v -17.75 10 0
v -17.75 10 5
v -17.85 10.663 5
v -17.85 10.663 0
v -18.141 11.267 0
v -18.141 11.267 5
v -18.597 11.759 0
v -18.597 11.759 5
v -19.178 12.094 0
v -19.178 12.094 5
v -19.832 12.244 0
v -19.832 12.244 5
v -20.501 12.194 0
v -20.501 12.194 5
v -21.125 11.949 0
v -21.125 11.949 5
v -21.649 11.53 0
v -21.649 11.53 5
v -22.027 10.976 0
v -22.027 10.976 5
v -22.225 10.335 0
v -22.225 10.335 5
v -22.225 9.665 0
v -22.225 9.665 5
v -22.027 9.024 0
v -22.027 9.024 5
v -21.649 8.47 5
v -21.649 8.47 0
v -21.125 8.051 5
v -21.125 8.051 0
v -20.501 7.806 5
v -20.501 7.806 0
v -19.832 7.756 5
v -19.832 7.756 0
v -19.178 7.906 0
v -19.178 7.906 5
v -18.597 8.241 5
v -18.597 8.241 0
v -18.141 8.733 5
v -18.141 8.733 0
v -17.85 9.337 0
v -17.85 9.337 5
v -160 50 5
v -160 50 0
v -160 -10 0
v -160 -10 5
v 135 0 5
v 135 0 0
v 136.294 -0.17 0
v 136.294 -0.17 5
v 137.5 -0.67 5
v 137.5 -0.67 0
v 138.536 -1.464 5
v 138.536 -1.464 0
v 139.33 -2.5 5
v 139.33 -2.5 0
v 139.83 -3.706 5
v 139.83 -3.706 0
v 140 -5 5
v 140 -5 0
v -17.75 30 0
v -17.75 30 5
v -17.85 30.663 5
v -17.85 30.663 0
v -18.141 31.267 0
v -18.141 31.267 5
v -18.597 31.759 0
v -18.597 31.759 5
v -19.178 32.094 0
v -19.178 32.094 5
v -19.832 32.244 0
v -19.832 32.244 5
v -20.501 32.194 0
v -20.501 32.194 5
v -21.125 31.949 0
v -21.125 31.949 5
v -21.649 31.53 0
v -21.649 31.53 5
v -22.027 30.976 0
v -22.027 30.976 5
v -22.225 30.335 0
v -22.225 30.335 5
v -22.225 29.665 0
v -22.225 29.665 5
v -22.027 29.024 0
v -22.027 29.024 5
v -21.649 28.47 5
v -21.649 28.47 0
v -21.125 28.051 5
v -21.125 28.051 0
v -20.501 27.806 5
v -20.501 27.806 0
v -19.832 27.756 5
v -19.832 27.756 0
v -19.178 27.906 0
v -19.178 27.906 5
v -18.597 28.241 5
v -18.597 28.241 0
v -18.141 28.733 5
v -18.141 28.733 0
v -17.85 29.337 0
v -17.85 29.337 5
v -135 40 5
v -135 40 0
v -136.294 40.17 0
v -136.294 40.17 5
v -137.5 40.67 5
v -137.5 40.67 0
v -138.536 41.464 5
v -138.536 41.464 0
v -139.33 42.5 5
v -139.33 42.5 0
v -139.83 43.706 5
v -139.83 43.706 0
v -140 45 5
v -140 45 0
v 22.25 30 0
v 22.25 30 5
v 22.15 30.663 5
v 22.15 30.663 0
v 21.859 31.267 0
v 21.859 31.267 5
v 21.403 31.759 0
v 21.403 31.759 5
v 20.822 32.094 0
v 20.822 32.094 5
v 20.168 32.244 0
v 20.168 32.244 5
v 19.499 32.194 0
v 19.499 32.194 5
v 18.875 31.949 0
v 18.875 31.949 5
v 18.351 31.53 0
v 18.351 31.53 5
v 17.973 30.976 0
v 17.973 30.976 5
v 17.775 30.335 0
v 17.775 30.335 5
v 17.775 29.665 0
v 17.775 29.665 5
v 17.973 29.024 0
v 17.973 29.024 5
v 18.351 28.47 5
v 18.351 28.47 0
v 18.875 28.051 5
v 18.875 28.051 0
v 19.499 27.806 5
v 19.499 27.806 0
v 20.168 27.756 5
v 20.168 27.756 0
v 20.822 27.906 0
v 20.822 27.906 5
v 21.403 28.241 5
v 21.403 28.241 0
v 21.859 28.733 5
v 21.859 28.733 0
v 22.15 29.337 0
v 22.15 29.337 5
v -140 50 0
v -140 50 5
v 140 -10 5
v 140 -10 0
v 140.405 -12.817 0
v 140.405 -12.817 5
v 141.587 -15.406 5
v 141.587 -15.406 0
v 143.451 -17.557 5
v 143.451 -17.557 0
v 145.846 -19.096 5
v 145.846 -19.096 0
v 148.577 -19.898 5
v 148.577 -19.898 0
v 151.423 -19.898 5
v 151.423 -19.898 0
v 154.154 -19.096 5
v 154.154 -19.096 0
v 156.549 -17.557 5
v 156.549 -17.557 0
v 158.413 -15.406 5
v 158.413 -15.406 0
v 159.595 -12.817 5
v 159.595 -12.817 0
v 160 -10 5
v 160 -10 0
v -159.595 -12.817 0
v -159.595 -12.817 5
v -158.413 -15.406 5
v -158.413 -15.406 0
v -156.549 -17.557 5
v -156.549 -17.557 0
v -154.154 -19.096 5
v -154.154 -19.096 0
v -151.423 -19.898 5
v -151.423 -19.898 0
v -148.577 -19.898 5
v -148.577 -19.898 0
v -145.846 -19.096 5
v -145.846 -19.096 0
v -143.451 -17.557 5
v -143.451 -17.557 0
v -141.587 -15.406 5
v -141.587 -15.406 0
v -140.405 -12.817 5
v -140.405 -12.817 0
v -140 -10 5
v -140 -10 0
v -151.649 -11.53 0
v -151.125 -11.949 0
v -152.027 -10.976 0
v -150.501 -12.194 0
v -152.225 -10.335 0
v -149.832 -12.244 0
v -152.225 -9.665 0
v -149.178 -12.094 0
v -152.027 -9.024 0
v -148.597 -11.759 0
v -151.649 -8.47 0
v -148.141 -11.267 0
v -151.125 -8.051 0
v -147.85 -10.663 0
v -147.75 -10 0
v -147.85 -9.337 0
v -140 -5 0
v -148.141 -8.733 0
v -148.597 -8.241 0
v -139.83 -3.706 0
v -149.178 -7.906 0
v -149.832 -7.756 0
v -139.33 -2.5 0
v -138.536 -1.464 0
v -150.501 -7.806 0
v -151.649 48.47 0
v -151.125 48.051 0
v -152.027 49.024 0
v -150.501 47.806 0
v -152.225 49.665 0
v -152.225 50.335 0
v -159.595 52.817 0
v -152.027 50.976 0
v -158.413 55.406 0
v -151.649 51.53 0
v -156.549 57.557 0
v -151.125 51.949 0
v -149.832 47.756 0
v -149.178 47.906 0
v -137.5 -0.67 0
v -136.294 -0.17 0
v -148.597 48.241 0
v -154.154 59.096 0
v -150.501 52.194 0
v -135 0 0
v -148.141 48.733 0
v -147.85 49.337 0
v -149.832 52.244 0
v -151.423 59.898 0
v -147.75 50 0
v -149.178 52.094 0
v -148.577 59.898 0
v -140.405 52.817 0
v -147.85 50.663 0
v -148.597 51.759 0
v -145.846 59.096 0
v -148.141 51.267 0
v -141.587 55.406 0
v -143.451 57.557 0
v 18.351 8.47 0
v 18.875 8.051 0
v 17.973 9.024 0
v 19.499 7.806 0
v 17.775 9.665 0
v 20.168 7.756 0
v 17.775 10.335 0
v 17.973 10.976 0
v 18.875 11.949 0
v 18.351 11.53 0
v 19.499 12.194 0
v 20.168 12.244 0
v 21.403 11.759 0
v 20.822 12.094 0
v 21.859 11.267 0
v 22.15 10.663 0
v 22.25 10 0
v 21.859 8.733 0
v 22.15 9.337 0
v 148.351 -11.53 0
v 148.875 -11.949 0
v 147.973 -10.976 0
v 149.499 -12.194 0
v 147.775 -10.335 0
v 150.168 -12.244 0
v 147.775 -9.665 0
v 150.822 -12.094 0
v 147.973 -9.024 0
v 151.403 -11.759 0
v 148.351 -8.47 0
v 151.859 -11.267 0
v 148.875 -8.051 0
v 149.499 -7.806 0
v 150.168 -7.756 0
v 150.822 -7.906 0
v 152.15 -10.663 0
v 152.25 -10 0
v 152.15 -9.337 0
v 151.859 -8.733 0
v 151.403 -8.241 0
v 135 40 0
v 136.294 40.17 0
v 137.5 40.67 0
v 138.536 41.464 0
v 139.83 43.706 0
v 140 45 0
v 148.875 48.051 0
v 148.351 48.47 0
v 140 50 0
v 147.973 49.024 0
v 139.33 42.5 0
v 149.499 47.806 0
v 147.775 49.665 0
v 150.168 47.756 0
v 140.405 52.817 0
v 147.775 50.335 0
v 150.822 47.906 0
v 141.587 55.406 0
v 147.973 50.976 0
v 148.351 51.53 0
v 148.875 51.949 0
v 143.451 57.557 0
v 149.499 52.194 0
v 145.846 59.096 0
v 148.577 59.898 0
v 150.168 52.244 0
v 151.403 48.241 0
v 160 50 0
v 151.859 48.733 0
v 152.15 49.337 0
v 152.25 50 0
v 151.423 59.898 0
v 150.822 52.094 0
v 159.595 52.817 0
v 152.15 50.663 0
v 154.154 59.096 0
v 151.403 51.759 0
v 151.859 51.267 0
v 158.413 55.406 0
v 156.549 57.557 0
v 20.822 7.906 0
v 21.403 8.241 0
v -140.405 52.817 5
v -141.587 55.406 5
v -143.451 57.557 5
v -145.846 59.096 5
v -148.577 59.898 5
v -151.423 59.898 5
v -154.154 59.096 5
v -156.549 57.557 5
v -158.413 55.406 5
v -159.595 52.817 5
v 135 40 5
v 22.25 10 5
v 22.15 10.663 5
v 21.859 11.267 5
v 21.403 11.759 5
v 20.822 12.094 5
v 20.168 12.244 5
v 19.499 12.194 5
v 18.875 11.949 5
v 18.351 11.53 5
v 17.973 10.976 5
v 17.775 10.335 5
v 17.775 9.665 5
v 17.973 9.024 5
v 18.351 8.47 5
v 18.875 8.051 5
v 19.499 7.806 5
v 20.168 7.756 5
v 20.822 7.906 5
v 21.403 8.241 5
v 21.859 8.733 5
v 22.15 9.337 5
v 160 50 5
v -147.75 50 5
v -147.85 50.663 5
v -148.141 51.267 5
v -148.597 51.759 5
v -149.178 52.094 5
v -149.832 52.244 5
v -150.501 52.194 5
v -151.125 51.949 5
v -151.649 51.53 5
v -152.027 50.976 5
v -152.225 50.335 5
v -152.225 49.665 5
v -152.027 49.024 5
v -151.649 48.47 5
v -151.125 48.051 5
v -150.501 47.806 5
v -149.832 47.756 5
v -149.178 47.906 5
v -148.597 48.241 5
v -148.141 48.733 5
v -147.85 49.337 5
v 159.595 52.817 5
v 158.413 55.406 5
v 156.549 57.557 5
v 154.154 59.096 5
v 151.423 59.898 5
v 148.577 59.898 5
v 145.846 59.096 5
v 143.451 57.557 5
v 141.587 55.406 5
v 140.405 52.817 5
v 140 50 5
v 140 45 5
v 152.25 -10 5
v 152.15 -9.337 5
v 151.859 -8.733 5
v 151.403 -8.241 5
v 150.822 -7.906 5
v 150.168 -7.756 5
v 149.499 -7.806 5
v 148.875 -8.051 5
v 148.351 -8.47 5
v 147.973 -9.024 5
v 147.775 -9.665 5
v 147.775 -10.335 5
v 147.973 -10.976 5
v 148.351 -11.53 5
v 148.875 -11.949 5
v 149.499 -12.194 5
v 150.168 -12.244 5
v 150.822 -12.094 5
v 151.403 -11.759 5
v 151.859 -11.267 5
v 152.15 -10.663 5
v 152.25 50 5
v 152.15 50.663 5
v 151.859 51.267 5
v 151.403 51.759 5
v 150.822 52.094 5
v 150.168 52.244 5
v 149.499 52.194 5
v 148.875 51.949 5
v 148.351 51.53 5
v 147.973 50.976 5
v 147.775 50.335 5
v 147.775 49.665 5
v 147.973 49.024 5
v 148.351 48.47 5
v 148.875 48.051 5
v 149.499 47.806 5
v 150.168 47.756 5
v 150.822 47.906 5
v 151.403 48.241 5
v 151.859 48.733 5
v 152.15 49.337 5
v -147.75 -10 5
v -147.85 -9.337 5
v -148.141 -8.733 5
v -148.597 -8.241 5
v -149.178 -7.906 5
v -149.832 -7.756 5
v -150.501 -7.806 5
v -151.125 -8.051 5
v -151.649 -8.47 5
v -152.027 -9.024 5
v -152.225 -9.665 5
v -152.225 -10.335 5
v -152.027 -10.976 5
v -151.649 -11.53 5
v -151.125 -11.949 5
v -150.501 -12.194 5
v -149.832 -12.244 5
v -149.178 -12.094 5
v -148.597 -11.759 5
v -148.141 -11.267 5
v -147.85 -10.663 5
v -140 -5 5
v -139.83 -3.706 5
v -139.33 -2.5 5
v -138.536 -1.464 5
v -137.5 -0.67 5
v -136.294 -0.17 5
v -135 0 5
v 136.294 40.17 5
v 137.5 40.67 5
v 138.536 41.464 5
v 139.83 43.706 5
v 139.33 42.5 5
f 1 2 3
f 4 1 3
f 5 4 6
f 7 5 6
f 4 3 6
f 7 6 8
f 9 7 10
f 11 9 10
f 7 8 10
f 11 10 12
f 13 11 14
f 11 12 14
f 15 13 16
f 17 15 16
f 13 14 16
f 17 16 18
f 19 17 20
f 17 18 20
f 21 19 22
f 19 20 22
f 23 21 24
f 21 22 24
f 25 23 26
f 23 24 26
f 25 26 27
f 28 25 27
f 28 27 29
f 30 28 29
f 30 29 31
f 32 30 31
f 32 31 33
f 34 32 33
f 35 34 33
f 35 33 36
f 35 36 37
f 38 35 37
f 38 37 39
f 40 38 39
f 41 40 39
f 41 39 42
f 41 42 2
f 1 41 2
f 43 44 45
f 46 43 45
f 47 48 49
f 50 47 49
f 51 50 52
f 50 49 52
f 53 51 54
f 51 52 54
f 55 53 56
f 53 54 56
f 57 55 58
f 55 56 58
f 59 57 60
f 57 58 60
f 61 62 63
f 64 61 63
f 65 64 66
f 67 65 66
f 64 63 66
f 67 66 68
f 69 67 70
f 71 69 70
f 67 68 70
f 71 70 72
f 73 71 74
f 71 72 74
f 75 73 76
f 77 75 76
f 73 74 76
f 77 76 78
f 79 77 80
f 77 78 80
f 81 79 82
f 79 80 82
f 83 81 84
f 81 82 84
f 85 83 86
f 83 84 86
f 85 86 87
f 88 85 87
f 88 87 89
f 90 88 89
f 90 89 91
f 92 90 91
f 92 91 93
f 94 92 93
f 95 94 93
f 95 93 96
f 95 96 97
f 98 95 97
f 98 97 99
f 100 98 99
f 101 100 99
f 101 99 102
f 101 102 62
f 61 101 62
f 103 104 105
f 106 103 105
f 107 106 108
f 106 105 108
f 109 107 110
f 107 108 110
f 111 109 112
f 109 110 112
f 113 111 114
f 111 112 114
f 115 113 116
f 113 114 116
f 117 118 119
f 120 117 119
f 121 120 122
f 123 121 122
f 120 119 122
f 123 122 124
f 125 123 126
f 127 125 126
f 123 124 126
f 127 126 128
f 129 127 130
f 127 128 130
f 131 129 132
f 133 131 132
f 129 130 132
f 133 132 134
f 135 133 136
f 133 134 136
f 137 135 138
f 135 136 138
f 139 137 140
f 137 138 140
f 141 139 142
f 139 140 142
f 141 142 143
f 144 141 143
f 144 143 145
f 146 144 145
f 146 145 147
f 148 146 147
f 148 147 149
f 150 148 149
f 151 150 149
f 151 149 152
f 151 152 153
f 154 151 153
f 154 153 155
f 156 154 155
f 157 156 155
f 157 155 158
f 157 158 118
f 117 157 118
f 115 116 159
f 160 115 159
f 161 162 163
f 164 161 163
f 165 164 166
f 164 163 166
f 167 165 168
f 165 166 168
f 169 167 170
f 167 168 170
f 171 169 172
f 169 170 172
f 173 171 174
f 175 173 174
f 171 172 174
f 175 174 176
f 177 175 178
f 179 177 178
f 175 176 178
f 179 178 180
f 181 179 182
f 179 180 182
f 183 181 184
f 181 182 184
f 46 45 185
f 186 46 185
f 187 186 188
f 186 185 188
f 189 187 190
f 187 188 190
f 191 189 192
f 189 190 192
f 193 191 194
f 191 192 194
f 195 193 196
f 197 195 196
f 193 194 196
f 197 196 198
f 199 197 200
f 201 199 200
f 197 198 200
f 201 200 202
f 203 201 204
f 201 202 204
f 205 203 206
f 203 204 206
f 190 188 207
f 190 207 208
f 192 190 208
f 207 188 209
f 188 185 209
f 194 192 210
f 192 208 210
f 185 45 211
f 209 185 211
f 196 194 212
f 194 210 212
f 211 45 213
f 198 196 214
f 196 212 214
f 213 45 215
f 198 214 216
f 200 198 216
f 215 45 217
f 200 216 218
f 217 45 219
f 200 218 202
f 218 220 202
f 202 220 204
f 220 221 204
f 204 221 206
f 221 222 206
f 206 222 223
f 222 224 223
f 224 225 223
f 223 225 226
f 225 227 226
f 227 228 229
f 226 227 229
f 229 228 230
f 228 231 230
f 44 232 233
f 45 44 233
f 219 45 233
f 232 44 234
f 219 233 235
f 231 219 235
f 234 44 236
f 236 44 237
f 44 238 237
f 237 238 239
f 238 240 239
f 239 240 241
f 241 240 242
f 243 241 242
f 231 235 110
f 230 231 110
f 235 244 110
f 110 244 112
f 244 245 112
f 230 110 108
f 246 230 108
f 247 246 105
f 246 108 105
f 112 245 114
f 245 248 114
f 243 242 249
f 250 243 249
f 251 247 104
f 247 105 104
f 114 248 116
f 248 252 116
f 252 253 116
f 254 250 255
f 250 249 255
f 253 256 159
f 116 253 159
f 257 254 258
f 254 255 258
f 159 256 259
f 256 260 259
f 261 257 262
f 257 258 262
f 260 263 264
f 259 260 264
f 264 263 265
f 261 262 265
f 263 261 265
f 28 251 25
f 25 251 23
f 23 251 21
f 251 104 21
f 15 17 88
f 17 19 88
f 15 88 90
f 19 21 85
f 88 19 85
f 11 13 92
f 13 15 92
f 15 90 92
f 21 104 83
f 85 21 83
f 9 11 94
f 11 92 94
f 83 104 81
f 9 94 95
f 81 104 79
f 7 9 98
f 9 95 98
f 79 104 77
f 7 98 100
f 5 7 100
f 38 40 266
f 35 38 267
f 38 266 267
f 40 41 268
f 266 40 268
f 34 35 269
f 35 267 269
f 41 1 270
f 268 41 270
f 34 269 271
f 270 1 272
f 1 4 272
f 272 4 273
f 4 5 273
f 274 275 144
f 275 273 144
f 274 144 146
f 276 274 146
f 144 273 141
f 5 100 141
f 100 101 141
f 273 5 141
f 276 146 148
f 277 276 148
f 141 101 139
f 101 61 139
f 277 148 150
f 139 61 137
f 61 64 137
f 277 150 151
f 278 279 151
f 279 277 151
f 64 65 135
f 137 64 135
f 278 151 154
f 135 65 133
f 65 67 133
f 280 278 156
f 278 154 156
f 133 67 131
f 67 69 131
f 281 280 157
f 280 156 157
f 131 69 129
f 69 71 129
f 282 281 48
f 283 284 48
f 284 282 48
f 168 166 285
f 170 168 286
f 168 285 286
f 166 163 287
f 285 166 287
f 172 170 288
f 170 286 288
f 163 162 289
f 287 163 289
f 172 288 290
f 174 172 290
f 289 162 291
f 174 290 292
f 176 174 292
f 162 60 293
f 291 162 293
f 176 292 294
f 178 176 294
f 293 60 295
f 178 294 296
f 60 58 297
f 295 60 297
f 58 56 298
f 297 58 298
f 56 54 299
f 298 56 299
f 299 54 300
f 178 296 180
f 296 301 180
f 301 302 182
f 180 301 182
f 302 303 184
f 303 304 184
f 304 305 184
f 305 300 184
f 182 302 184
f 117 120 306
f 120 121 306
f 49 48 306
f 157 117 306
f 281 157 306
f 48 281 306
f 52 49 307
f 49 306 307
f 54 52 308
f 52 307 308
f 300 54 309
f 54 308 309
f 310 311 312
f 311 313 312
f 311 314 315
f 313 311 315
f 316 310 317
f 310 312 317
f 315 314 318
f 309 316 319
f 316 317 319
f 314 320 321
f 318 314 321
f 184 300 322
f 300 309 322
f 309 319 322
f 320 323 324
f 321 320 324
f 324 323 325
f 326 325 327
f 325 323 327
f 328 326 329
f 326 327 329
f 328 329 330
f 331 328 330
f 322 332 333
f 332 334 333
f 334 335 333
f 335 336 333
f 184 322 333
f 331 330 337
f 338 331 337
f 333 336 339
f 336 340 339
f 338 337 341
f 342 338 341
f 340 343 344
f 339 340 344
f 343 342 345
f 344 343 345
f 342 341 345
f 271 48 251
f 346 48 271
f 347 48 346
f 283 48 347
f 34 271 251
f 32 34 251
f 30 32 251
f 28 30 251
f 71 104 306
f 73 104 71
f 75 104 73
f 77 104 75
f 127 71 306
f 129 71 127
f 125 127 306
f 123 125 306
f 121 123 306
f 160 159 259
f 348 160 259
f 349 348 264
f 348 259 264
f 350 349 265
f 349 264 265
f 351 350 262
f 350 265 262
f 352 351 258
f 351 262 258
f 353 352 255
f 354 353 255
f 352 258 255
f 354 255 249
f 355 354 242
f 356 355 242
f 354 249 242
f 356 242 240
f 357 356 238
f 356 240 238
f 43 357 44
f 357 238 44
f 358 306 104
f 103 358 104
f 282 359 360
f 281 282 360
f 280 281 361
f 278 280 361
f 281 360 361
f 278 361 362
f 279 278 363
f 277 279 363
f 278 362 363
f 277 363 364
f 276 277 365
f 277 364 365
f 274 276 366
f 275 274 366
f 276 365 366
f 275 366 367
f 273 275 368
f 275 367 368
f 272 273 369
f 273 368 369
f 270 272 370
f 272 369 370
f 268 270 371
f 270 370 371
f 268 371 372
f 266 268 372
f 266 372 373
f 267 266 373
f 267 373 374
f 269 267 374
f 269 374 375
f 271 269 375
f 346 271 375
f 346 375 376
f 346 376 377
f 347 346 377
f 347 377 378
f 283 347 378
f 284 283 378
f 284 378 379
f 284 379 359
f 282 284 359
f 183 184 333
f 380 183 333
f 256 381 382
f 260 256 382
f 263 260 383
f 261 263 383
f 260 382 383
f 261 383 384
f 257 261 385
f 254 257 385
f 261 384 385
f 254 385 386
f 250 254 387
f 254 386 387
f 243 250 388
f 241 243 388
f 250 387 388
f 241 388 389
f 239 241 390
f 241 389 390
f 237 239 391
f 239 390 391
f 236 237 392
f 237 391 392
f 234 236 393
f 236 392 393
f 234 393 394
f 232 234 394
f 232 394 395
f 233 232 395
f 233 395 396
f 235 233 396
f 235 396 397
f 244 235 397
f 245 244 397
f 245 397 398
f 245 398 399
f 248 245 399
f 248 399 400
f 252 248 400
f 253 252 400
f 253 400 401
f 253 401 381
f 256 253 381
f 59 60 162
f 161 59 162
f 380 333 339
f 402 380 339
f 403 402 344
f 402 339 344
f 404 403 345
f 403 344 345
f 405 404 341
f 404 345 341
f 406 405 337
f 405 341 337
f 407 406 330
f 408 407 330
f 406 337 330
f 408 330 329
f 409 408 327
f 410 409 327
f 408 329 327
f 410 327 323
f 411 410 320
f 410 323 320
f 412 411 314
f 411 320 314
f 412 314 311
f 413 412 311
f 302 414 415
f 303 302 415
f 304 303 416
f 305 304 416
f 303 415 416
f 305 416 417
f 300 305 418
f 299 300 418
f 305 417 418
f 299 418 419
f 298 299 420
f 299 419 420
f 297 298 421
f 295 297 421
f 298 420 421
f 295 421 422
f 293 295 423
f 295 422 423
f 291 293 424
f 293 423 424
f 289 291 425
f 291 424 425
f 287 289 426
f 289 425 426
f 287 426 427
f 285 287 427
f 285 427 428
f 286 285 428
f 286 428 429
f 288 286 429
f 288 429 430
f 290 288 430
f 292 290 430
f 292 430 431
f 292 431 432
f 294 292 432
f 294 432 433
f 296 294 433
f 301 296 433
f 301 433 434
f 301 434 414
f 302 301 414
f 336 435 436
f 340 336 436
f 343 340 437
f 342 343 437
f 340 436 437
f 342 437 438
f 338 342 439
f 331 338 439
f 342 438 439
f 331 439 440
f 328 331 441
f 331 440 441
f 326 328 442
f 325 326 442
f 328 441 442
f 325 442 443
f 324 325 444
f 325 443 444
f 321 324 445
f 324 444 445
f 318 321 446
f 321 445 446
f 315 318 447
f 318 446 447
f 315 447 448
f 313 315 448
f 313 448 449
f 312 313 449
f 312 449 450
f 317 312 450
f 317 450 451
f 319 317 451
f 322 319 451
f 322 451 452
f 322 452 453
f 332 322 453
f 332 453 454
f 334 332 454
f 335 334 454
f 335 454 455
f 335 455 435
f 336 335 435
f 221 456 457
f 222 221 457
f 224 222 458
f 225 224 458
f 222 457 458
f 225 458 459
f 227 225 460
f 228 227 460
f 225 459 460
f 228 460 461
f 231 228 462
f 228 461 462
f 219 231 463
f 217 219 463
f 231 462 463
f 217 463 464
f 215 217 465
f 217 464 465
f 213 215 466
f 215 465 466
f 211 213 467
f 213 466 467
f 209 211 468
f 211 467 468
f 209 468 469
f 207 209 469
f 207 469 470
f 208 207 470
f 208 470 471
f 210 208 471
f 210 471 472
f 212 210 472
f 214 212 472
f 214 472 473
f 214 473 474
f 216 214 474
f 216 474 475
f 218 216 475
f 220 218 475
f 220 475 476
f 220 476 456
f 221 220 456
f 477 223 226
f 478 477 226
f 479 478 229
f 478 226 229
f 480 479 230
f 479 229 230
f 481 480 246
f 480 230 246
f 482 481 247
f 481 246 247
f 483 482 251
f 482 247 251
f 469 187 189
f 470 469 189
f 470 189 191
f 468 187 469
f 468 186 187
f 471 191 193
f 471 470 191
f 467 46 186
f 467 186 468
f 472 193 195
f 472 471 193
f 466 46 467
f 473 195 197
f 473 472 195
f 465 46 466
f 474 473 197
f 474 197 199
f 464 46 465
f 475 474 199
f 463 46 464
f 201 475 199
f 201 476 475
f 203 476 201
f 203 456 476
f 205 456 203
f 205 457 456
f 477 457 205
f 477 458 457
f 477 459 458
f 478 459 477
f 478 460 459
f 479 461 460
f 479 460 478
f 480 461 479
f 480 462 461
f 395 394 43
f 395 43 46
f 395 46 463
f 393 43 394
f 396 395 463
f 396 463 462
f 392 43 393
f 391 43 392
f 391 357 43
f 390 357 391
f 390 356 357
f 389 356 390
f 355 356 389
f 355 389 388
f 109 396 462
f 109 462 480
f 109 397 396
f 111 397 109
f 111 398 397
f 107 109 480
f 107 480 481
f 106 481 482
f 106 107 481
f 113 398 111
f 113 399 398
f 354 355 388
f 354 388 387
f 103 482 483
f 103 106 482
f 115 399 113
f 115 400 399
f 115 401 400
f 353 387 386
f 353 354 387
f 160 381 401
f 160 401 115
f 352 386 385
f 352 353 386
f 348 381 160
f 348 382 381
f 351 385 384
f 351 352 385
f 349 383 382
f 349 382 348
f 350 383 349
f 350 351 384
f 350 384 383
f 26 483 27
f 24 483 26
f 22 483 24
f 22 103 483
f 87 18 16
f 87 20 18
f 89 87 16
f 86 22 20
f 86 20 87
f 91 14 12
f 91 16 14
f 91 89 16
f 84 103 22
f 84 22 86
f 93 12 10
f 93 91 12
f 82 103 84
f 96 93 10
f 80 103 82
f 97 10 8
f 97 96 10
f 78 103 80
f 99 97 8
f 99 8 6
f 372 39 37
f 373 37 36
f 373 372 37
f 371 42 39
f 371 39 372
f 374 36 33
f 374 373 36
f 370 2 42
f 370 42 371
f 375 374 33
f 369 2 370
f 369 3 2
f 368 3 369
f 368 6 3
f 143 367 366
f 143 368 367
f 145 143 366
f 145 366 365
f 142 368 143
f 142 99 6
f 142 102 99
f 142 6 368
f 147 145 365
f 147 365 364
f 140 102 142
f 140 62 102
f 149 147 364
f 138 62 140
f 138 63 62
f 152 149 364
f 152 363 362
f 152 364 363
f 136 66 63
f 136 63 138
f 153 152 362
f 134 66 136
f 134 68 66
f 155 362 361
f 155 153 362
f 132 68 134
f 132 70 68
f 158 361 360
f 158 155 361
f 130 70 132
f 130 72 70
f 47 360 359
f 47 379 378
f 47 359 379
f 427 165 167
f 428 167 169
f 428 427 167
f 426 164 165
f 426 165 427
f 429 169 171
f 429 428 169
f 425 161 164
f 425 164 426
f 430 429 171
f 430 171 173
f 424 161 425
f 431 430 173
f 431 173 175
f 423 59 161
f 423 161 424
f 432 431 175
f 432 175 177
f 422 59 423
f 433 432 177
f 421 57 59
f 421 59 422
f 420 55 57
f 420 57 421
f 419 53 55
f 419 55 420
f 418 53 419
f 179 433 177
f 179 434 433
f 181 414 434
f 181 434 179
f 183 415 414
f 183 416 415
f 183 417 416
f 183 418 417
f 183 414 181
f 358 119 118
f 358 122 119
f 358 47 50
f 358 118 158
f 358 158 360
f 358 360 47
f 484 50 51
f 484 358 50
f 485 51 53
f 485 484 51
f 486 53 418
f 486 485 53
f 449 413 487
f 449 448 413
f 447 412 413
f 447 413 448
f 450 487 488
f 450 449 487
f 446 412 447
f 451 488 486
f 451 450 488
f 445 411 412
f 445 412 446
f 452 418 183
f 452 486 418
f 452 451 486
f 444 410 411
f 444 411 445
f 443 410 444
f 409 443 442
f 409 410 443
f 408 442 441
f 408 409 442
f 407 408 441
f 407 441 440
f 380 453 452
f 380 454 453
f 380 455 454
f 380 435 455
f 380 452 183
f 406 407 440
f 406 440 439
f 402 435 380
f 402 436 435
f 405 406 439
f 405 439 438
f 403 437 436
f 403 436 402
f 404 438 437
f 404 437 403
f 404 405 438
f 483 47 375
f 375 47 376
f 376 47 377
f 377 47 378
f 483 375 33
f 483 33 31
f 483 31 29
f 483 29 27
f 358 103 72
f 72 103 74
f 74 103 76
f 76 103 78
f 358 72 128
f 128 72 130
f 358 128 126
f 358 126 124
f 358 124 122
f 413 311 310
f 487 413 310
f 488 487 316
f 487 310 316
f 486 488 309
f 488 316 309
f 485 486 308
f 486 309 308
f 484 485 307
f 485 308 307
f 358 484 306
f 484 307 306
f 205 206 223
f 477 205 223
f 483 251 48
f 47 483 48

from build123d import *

# Parameters (mm, degrees)
BOSS_EXTRU_1_DEPTH = 5
D_GAGEMENT_M41_D   = 4.5
D_GAGEMENT_M42_D   = 4.5


with BuildPart() as part:
    # Esquisse1 → Boss.-Extru.1 (new body)
    with BuildSketch(Plane.XY):
        with BuildLine():
            Line((-135, 0), (135, 0))
            ThreePointArc((135, 0), (138.535533906, -1.464466094), (140, -5))
            Line((140, -5), (140, -10))
            ThreePointArc((140, -10), (150, -20), (160, -10))
            Line((160, -10), (160, 50))
            ThreePointArc((160, 50), (150, 60), (140, 50))
            Line((140, 50), (140, 45))
            ThreePointArc((140, 45), (138.535533906, 41.464466094), (135, 40))
            Line((135, 40), (-135, 40))
            ThreePointArc((-135, 40), (-138.535533906, 41.464466094), (-140, 45))
            Line((-140, 45), (-140, 50))
            ThreePointArc((-140, 50), (-150, 60), (-160, 50))
            Line((-160, 50), (-160, -10))
            ThreePointArc((-160, -10), (-150, -20), (-140, -10))
            Line((-140, -10), (-140, -5))
            ThreePointArc((-140, -5), (-138.535533906, -1.464466094), (-135, 0))
        make_face()
    extrude(amount=BOSS_EXTRU_1_DEPTH)

    # Dégagement M41 (through all)
    with Locations(Plane(origin=(0, 0, 0), x_dir=(-1, 0, 0), z_dir=(0, 0, -1))):
        with Locations((-150, -10), (150, 50), (150, -10), (-150, 50)):
            Hole(D_GAGEMENT_M41_D / 2)

    # Dégagement M42 (through all)
    with Locations(Plane(origin=(0, 0, 0), x_dir=(-1, 0, 0), z_dir=(0, 0, -1))):
        with Locations((20, 10), (-20, 10), (-20, 30), (20, 30)):
            Hole(D_GAGEMENT_M42_D / 2)


solid = part.part
